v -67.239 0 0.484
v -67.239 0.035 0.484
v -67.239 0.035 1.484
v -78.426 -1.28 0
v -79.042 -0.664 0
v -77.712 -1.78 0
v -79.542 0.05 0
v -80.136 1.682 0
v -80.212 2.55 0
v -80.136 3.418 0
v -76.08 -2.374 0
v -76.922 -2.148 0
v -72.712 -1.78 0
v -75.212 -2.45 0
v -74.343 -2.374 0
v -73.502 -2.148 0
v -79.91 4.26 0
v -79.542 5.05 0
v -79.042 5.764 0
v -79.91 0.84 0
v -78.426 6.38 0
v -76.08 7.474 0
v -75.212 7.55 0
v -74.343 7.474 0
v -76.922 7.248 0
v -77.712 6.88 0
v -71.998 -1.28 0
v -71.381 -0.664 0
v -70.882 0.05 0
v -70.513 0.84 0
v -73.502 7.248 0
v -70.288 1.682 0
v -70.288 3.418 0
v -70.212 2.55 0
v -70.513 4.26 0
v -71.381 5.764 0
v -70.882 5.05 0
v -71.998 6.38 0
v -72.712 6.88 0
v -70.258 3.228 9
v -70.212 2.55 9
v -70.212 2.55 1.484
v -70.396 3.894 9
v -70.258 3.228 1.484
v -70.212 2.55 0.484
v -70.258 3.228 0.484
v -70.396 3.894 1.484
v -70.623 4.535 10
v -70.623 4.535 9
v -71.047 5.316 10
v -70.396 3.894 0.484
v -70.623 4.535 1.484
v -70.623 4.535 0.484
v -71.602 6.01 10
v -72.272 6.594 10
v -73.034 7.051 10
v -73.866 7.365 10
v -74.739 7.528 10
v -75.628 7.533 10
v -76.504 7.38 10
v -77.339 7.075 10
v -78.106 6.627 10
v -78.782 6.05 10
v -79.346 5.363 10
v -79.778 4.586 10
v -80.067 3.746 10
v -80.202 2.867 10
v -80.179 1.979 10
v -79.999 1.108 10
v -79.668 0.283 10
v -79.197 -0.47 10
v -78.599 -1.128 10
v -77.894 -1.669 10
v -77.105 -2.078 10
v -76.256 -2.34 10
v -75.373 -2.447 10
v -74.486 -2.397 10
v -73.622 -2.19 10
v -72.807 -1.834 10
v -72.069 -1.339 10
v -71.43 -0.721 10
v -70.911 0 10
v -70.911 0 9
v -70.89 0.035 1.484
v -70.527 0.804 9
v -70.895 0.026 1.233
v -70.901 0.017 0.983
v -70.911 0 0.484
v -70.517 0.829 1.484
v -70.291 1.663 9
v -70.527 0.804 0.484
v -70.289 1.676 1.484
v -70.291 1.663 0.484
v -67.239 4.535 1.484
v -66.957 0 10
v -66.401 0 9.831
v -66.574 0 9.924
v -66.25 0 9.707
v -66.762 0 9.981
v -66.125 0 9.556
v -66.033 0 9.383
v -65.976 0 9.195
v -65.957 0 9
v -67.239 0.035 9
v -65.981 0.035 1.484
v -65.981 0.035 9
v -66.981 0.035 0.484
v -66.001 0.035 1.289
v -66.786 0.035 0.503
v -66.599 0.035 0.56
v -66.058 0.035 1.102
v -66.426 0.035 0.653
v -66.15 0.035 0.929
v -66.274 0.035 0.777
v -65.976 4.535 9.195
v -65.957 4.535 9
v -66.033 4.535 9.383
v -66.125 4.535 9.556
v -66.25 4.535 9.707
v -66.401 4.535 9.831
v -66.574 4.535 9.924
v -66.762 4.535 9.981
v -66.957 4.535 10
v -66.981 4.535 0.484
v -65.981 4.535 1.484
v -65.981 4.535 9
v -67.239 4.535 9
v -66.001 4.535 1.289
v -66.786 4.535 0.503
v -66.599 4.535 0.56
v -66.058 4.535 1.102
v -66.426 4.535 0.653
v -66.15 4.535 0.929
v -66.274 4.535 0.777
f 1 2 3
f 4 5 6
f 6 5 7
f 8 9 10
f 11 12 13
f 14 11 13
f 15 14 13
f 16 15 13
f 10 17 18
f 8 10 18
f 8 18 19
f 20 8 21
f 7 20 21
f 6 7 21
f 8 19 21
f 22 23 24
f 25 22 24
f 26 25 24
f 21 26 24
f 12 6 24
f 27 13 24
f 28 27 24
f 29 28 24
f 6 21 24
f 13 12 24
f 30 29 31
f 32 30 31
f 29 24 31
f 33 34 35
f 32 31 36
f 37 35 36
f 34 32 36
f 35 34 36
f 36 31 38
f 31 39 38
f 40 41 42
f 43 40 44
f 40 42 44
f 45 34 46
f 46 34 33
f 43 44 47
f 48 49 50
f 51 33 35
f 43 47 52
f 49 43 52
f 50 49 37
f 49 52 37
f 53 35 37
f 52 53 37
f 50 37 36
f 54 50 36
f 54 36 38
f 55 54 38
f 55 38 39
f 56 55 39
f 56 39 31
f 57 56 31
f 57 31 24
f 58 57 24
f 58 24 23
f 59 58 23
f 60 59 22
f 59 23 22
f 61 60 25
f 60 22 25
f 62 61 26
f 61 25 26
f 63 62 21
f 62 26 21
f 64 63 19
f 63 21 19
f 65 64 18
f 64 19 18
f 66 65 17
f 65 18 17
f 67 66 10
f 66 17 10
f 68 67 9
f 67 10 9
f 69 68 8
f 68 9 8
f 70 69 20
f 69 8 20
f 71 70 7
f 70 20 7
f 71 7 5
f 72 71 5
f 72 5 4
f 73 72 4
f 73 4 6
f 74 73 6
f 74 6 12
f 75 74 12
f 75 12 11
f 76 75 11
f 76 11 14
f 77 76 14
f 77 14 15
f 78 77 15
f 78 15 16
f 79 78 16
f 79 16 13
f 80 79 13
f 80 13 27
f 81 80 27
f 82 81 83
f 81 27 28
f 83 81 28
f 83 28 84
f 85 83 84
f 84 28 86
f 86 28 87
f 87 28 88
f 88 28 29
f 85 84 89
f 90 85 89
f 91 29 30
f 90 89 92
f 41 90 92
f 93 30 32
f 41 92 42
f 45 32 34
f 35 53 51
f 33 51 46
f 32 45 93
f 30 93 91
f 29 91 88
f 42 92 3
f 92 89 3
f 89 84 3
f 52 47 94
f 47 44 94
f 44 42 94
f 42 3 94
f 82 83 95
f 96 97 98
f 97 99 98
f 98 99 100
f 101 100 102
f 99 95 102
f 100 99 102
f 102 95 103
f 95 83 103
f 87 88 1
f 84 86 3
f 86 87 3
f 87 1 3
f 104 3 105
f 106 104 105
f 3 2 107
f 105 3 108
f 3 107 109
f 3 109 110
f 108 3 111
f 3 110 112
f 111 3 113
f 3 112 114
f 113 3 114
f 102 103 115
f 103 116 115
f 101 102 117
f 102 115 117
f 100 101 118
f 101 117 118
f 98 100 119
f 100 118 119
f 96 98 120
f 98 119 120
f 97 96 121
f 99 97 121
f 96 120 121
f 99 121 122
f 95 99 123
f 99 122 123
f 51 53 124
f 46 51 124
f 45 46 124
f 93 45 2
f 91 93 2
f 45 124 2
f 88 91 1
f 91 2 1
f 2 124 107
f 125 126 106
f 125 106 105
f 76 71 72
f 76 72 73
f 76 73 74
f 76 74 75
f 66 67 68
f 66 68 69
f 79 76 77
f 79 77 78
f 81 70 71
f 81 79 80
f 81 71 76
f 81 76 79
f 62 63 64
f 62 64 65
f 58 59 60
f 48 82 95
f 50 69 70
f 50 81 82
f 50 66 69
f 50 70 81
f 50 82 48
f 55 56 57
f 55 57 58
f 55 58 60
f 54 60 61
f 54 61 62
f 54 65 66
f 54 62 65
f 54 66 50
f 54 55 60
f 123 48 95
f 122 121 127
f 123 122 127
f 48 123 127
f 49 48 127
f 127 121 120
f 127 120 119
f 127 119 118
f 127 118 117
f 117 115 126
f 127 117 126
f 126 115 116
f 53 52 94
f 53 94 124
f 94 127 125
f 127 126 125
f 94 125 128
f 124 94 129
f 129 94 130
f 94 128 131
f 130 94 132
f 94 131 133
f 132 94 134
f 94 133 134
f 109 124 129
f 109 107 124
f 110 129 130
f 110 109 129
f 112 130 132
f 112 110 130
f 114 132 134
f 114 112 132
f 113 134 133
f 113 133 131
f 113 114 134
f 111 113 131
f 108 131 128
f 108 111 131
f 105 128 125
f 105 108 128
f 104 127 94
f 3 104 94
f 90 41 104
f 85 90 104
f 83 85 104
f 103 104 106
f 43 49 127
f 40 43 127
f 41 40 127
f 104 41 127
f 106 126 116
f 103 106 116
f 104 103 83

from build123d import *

# Parameters (mm, degrees)
SKETCH_1_R      = 5
EXTRUDE_1_DEPTH = 10
SKETCH_9_W      = 7.120641766
SKETCH_9_H      = 4.534999238
EXTRUDE_6_DEPTH = 1
SKETCH_11_W     = 1.257653538
SKETCH_11_H     = 9
EXTRUDE_7_DEPTH = 4.5
EXTRUDE_8_DEPTH = 6
FILLET_8_R      = 1
FILLET_9_R      = 1


with BuildPart() as part:
    # 草圖1 → 填料-伸長1 (new body)
    with BuildSketch(Plane(origin=(0.382706605, 0, 0), x_dir=(1, 0, 0), z_dir=(0, 0, 1))):
        with Locations((-75.594417438, 2.55)):
            Circle(SKETCH_1_R)
    extrude(amount=EXTRUDE_1_DEPTH)

    # 草圖9 → 填料-伸長6 (add)
    with BuildSketch(Plane(origin=(6.127831546, 0, 9), x_dir=(1, 0, 0), z_dir=(0, 0, 1))):
        with Locations((-75.644850643, 2.267499619)):
            Rectangle(SKETCH_9_W, SKETCH_9_H)
    extrude(amount=EXTRUDE_6_DEPTH)



with BuildPart() as body_2:
    # 草圖11 → 填料-伸長7 (new body)
    with BuildSketch(Plane(origin=(9.574526933, 4.534999238, 0.48426017), x_dir=(1, 0, 0), z_dir=(0, 1, 0))):
        with Locations((-76.184774061, -4.5)):
            Rectangle(SKETCH_11_W, SKETCH_11_H)
    extrude(amount=-EXTRUDE_7_DEPTH)


with BuildPart() as part_1:
    add(part.part)

    add(body_2.part)  # 填料-伸長8 merges body 2
    # 草圖12 → 填料-伸長8 (add)
    with BuildSketch(Plane.ZY.offset(67.239073897)):
        Polygon((0.48426017, 4.534999238), (0.48426017, 0), (1.483647509, 0.034999238), (1.483647509, 4.534999238), align=None)
    extrude(amount=EXTRUDE_8_DEPTH)

    # 圓角8
    fillet_8_edges = [part_1.edges().sort_by_distance(p)[0] for p in [
        (-65.981420359, 2.284999238, 0.48426017),
    ]]
    fillet(fillet_8_edges, radius=FILLET_8_R)

    # 圓角9
    fillet_9_edges = [part_1.edges().sort_by_distance(p)[0] for p in [
        (-65.956698214, 2.267499619, 10),
    ]]
    fillet(fillet_9_edges, radius=FILLET_9_R - 0.0001)  # a hair under: the kernel refuses the full size


solid = part_1.part
